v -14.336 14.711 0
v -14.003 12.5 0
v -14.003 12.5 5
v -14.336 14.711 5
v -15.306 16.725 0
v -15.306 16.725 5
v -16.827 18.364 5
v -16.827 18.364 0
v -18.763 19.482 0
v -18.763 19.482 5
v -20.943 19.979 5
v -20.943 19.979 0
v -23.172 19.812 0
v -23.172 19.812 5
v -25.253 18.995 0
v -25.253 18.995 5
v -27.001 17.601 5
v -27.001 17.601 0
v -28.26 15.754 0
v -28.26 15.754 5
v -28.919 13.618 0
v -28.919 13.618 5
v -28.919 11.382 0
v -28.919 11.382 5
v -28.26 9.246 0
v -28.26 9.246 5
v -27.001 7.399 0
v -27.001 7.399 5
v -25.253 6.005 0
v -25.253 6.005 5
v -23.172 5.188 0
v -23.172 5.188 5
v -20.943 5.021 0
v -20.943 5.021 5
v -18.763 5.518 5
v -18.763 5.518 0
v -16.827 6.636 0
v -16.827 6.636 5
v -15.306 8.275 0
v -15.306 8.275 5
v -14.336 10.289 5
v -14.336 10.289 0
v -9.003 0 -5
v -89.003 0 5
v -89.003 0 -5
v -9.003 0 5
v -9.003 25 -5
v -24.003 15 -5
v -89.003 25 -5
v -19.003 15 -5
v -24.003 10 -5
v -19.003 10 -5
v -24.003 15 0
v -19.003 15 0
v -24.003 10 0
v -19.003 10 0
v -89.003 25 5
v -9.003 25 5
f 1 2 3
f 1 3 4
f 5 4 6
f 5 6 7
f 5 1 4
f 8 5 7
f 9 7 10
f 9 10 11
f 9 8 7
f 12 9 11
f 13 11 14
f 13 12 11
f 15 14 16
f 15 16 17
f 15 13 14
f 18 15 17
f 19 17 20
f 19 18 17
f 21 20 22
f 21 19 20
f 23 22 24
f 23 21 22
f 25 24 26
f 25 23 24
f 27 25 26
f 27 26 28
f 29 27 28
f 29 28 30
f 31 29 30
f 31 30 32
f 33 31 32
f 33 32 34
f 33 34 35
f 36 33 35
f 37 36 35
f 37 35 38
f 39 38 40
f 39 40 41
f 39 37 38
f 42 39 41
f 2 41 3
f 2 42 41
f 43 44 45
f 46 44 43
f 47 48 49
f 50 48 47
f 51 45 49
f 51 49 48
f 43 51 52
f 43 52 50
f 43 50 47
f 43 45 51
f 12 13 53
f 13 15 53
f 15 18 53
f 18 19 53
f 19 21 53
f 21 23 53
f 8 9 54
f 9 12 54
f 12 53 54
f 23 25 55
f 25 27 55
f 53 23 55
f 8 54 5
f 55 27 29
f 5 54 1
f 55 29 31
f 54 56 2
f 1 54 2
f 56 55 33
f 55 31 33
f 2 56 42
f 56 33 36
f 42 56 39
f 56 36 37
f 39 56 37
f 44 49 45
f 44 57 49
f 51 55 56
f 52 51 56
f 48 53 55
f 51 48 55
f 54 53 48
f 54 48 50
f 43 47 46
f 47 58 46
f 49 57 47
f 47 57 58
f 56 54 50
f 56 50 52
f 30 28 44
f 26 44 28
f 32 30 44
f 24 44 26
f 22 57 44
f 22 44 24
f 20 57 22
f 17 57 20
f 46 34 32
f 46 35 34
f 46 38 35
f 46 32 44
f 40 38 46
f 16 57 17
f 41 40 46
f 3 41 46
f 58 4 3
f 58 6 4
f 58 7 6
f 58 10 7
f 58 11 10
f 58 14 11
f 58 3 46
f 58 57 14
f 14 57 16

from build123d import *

# Parameters (mm, degrees)
F0_W     = 80
F0_H     = 25
F0_R     = 7.5
F1_DEPTH = 5
F2_W     = 80
F2_H     = 25
F2_R     = 7.5
F2_W_2   = 5
F2_H_2   = 5
F3_DEPTH = 5


with BuildPart() as f1:
    # F0 (on Top) → F1 (new body)
    with BuildSketch(Plane.XY):
        with Locations((-49.0031225234, 12.5)):
            Rectangle(F0_W, F0_H)
        with Locations((-21.5031225234, 12.5)):
            Circle(F0_R, mode=Mode.SUBTRACT)
    extrude(amount=F1_DEPTH)

    # F2 (on face) → F3 (join)
    with BuildSketch(Plane(origin=(0, 0, 0), x_dir=(1, 0, 0), z_dir=(0, 0, -1))):
        with Locations((-49.0031225234, -12.5)):
            Rectangle(F2_W, F2_H)
        with Locations((-21.5031225234, -12.5)):
            Circle(F2_R, mode=Mode.SUBTRACT)
        with Locations((-21.5031225234, -12.5)):
            Circle(F2_R)
        with Locations((-21.5031225234, -12.5)):
            Rectangle(F2_W_2, F2_H_2, mode=Mode.SUBTRACT)
    extrude(amount=F3_DEPTH)


solid = f1.part
